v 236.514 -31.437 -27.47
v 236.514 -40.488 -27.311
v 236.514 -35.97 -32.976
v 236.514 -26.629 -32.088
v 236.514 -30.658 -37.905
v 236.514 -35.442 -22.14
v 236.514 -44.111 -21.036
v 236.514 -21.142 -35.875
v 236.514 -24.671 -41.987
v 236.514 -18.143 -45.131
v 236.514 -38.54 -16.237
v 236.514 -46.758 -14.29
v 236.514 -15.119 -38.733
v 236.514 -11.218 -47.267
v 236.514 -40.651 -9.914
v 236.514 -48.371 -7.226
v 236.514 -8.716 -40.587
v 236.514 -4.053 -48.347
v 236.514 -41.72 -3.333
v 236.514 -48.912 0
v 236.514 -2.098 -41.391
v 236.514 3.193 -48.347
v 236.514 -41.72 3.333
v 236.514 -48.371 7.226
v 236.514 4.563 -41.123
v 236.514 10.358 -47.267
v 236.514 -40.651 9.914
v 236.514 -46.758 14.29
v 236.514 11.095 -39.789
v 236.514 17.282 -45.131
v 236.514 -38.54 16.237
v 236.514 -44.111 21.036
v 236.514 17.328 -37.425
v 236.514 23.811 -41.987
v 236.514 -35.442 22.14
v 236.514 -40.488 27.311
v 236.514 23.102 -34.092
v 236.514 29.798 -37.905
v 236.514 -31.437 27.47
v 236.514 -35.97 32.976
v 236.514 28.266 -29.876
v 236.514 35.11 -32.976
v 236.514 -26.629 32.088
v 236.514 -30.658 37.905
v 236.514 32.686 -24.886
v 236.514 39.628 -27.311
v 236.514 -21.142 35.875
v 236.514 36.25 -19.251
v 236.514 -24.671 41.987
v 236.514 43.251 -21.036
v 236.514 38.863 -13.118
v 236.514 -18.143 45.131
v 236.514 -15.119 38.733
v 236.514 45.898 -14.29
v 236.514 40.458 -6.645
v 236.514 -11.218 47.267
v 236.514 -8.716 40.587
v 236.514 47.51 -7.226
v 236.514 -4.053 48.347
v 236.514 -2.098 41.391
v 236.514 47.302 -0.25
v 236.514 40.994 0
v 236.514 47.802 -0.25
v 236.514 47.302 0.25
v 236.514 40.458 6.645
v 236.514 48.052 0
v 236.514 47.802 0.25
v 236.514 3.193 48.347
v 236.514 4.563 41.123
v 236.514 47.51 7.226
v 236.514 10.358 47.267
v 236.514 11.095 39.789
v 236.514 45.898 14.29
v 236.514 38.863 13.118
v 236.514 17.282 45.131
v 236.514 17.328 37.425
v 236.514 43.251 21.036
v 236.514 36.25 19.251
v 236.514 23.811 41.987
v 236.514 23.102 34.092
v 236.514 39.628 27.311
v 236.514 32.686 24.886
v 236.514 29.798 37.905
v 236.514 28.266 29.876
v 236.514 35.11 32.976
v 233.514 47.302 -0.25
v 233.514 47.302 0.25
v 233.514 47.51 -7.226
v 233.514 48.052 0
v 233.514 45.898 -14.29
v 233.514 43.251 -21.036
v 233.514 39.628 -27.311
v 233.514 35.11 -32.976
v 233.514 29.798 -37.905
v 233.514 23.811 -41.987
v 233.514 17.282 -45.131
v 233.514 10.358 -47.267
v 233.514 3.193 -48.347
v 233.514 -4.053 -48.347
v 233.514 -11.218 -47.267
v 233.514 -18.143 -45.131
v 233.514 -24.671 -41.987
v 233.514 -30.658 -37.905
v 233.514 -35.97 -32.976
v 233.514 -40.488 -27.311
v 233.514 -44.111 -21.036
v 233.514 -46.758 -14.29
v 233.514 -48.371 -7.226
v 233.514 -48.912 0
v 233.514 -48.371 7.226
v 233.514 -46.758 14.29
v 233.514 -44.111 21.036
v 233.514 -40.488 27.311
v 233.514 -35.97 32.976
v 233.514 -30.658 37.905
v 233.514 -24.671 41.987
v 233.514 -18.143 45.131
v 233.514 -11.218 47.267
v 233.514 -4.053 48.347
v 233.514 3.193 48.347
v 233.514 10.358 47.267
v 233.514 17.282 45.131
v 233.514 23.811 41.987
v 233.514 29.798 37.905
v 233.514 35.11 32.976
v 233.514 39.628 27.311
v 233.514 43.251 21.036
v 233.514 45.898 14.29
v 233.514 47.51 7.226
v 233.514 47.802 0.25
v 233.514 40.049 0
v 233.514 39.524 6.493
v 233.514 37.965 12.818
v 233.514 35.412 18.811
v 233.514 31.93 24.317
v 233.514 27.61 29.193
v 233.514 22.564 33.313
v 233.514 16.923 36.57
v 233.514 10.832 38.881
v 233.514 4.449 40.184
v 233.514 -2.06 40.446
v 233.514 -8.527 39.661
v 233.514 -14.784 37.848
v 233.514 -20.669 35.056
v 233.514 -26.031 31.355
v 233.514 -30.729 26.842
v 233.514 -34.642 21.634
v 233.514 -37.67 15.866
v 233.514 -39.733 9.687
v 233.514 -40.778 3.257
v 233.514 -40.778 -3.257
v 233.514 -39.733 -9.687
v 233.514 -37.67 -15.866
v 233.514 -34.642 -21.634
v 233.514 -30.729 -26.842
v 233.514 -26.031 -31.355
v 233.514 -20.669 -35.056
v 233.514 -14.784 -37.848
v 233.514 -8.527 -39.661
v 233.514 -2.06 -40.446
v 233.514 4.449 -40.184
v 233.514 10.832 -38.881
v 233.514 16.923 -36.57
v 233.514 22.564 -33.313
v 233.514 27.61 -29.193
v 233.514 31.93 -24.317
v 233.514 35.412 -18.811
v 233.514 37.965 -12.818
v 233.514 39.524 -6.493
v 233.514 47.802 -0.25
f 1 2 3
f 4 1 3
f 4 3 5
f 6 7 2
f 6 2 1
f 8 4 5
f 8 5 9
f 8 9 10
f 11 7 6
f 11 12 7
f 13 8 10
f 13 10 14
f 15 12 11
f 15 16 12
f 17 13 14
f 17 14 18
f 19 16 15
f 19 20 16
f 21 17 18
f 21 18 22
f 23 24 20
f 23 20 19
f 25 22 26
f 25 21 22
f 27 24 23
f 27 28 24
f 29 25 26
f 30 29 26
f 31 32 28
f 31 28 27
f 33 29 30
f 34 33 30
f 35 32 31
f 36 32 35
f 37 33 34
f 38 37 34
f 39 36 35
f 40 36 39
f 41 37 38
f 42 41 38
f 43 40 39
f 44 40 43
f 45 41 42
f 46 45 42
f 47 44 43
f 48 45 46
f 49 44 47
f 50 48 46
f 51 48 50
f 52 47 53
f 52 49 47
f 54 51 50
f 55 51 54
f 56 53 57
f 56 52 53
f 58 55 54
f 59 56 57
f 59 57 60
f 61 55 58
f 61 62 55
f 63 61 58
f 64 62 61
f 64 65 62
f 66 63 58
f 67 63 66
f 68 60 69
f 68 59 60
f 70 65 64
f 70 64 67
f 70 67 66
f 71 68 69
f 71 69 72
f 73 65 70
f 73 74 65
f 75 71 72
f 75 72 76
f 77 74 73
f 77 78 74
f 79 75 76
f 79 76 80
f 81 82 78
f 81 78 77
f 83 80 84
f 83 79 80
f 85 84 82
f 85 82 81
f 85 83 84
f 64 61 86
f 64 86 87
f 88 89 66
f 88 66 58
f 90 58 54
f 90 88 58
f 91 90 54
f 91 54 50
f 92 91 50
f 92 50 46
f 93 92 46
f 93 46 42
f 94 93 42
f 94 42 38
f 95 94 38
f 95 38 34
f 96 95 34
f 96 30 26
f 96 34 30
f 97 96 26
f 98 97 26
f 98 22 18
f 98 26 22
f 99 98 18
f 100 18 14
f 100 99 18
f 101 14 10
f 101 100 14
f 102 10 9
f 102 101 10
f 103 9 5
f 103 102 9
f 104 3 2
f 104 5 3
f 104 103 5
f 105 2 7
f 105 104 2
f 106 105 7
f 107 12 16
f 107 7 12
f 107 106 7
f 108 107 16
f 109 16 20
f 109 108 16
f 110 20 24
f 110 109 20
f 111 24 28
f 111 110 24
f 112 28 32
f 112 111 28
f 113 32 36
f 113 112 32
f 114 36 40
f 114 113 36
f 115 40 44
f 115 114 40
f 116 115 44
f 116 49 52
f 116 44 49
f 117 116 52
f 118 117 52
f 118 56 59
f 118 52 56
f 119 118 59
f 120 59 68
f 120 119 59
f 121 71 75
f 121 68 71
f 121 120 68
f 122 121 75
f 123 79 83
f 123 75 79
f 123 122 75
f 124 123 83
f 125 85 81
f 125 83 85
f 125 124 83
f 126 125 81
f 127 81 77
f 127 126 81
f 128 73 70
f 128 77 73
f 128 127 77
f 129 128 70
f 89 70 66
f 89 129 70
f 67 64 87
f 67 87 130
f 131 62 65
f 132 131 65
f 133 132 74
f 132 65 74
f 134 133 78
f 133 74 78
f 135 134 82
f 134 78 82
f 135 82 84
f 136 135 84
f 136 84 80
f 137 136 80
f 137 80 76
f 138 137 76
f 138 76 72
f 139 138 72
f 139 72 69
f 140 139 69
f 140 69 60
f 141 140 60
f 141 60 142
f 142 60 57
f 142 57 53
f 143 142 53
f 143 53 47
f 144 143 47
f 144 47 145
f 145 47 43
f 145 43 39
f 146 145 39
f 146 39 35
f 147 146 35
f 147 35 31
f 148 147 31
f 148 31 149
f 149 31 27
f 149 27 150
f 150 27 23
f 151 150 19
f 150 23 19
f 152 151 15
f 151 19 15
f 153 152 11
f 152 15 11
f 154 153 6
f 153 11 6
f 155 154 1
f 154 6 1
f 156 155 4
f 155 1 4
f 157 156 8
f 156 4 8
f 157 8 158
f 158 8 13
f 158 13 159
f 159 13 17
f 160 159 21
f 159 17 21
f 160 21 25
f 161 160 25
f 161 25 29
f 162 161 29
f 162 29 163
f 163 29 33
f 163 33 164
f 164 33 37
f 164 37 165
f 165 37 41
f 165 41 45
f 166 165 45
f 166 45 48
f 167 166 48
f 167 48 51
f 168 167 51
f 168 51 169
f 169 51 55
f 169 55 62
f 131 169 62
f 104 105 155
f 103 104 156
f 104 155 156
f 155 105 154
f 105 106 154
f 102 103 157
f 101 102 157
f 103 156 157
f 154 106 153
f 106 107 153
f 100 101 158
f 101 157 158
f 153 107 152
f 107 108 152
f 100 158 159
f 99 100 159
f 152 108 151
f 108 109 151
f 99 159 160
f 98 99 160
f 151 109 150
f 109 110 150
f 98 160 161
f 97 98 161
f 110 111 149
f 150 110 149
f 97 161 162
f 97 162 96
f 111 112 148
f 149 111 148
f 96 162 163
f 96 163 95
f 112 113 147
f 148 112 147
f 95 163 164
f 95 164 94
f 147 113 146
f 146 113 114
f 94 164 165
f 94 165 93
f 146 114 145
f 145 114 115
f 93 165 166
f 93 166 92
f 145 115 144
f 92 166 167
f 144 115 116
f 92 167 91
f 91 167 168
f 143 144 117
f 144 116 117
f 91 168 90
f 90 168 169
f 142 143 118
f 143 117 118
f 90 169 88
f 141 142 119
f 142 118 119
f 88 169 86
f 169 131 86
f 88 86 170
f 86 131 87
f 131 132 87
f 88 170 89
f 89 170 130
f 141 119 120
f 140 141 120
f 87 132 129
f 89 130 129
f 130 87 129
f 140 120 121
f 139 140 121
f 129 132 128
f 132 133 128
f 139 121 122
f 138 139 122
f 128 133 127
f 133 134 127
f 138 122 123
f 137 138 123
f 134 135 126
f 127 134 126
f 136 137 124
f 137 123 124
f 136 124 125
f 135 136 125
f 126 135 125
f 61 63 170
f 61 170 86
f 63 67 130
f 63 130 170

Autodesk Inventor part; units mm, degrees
ref_plane "YZ Plane" through (0, 0, 0) normal (1, 0, 0) x (0, 1, 0)
ref_plane "XZ Plane" through (0, 0, 0) normal (0, 1, 0) x (-1, 0, 0)
ref_plane "XY Plane" through (0, 0, 0) normal (0, 0, 1) x (1, 0, 0)
sketch "Sketch1" plane through (0, 0, 0) normal (0, 0, 1) x (1, 0, 0)
  arc A0 (180.1312, 23.4516) -> (181.5833, 23.6751) centre (180.1312, 28.2803) ccw
  arc A1 (180.1312, 23.4516) -> (181.5842, 23.6753) centre (180.1312, 28.2803) ccw
  arc A2 (167.724, 26.7761) -> (180.1312, 23.4516) centre (180.1312, 48.266) ccw
  arc A3 (166.724, 25.044) -> (180.1312, 21.4516) centre (180.1312, 48.266) ccw
  line L0 (125.6541, 47.7887) -> (168.987, 22.7705)
  line L1 (124.6541, 46.0566) -> (167.987, 21.0384)
  arc A4 (180.1312, 21.4516) -> (182.1847, 21.7676) centre (180.1312, 28.2803) ccw
  arc A5 (124.6541, 46.0566) -> (31.2848, 71.0749) centre (31.2848, -115.6637) ccw
  arc A6 (125.6541, 47.7887) -> (31.2848, 73.0749) centre (31.2848, -115.6637) ccw
  line L2 (1.263, 71.0749) -> (31.2848, 71.0749)
  line L3 (1.263, 73.0749) -> (31.2848, 73.0749)
  line L4 (236.5136, 40.9945) -> (181.5833, 23.6751)
  line L5 (182.1847, 21.7676) -> (237.115, 39.0871)
  line L6 (1.263, -0.4301) -> (320.4324, -0.4301)
  line L7 (236.5136, 40.9945) -> (237.115, 39.0871)
  line L8 (1.263, 84.1749) -> (31.2848, 84.1749)
  line L9 (167.987, 21.0384) -> (167.987, -8.65)
  line L10 (31.2848, 84.1749) -> (166.987, 84.1749)
  line L11 (233.5136, 47.8077) -> (145.7323, 20.1304)
  line L12 (234.2883, 48.052) -> (238.3779, 48.052)
  line L13 (234.2883, 48.052) -> (168.987, 48.052)
  line L14 (168.987, 86.1749) -> (31.2848, 86.1749)
  line L15 (31.2848, 86.1749) -> (1.263, 86.1749)
  line L16 (234.2883, 50.052) -> (170.987, 50.052)
  line L17 (169.987, 21.0384) -> (169.987, 27.7779)
  line L18 (169.987, 51.052) -> (169.987, 85.1749)
  line L19 (167.987, 21.0384) -> (167.987, 27.1473)
  line L20 (167.987, 49.052) -> (167.987, 83.1749)
  arc A7 (167.987, 83.1749) -> (166.987, 84.1749) centre (166.987, 83.1749) ccw
  arc A8 (169.987, 85.1749) -> (168.987, 86.1749) centre (168.987, 85.1749) ccw
  arc A9 (169.987, 51.052) -> (170.987, 50.052) centre (170.987, 51.052) ccw
  arc A10 (167.987, 49.052) -> (168.987, 48.052) centre (168.987, 49.052) ccw
  line L21 (1.263, 84.1749) -> (1.263, 86.1749)
  line L22 (238.3779, 48.052) -> (238.3779, 50.052)
  line L23 (234.2883, 50.052) -> (238.3779, 50.052)
  line L24 (236.5136, 40.9945) -> (236.5136, 48.052)
  line L25 (236.5136, 48.052) -> (233.5136, 48.052)
  line L26 (233.5136, 48.052) -> (233.5136, 40.0486)
  line L27 (233.5136, 48.052) -> (234.2883, 48.052)
  line L28 (233.5136, 48.052) -> (233.5136, 47.8077)
  dimension "d40" = 30.0219
  dimension "d41" = 186.7386
  dimension "d42" = 0
  dimension "d43" = 0
  dimension "d44" = 71.505
  dimension "d45" = 2
  dimension "d46" = 2
  dimension "d47" = 2
  dimension "d48" = 2
  dimension "d49" = 2
  dimension "d50" = 17.5
  dimension "d51" = 54.9303
  dimension "d52" = 2
  dimension "d53" = 11.1
  dimension "d54" = 7.4
  dimension "d55" = 17.5
  dimension "d56" = 2
  dimension "d57" = 2
  dimension "d58" = 1
  dimension "d59" = 1
  dimension "d60" = 1
  dimension "d61" = 1
  dimension "d62" = 3
revolve "Revolution1" add sketch "Sketch1" angle 360 about axis through (1.263, -0.4301, 0) along (1, 0, 0) contours L26 L13 L12 L24 L4
sketch "Sketch2" plane through (236.5136, -0.4301, 0) normal (1, 0, 0) x (0, 0, -1)
  circle A0 centre (0, 0) radius 41.4246 projected
  line L0 (0, 41.4246) -> (0, 46.1871)
  circle A1 centre (0, 46.1871) radius 4.7625
  point P0 (0, 0.4301)
  dimension "d63" = 4.7625
  dimension "d64" = 9.525
sketch "Sketch5" plane through (236.5136, -0.4301, 0) normal (1, 0, 0) x (0, 0, -1)
  circle A0 centre (0, 42.1815) radius 4.7625 projected
  circle A1 centre (0, 0) radius 48.4822 projected
  line L0 (0, 48.4822) -> (0, 47.9822)
  line L1 (0.25, 47.7322) -> (-0.25, 47.7322)
  line L2 (-0.25, 47.7322) -> (-0.25, 48.2322)
  line L3 (-0.25, 48.2322) -> (0.25, 48.2322)
  line L4 (0.25, 48.2322) -> (0.25, 47.7322)
  line L5 (0.25, 47.7322) -> (-0.25, 48.2322) construction
  line L6 (-0.25, 47.7322) -> (0.25, 48.2322) construction
  point P0 (0, 0.4301)
  point P1 (0, 41.4246)
  dimension "d72" = 0.5
  dimension "d76" = 0.5
  dimension "d77" = 0.5
extrude "Extrusion1" cut sketch "Sketch5" against normal blind 3.5 contours L3 L4 L1 L2
properties part number "back bracket" material "Stainless Steel"
